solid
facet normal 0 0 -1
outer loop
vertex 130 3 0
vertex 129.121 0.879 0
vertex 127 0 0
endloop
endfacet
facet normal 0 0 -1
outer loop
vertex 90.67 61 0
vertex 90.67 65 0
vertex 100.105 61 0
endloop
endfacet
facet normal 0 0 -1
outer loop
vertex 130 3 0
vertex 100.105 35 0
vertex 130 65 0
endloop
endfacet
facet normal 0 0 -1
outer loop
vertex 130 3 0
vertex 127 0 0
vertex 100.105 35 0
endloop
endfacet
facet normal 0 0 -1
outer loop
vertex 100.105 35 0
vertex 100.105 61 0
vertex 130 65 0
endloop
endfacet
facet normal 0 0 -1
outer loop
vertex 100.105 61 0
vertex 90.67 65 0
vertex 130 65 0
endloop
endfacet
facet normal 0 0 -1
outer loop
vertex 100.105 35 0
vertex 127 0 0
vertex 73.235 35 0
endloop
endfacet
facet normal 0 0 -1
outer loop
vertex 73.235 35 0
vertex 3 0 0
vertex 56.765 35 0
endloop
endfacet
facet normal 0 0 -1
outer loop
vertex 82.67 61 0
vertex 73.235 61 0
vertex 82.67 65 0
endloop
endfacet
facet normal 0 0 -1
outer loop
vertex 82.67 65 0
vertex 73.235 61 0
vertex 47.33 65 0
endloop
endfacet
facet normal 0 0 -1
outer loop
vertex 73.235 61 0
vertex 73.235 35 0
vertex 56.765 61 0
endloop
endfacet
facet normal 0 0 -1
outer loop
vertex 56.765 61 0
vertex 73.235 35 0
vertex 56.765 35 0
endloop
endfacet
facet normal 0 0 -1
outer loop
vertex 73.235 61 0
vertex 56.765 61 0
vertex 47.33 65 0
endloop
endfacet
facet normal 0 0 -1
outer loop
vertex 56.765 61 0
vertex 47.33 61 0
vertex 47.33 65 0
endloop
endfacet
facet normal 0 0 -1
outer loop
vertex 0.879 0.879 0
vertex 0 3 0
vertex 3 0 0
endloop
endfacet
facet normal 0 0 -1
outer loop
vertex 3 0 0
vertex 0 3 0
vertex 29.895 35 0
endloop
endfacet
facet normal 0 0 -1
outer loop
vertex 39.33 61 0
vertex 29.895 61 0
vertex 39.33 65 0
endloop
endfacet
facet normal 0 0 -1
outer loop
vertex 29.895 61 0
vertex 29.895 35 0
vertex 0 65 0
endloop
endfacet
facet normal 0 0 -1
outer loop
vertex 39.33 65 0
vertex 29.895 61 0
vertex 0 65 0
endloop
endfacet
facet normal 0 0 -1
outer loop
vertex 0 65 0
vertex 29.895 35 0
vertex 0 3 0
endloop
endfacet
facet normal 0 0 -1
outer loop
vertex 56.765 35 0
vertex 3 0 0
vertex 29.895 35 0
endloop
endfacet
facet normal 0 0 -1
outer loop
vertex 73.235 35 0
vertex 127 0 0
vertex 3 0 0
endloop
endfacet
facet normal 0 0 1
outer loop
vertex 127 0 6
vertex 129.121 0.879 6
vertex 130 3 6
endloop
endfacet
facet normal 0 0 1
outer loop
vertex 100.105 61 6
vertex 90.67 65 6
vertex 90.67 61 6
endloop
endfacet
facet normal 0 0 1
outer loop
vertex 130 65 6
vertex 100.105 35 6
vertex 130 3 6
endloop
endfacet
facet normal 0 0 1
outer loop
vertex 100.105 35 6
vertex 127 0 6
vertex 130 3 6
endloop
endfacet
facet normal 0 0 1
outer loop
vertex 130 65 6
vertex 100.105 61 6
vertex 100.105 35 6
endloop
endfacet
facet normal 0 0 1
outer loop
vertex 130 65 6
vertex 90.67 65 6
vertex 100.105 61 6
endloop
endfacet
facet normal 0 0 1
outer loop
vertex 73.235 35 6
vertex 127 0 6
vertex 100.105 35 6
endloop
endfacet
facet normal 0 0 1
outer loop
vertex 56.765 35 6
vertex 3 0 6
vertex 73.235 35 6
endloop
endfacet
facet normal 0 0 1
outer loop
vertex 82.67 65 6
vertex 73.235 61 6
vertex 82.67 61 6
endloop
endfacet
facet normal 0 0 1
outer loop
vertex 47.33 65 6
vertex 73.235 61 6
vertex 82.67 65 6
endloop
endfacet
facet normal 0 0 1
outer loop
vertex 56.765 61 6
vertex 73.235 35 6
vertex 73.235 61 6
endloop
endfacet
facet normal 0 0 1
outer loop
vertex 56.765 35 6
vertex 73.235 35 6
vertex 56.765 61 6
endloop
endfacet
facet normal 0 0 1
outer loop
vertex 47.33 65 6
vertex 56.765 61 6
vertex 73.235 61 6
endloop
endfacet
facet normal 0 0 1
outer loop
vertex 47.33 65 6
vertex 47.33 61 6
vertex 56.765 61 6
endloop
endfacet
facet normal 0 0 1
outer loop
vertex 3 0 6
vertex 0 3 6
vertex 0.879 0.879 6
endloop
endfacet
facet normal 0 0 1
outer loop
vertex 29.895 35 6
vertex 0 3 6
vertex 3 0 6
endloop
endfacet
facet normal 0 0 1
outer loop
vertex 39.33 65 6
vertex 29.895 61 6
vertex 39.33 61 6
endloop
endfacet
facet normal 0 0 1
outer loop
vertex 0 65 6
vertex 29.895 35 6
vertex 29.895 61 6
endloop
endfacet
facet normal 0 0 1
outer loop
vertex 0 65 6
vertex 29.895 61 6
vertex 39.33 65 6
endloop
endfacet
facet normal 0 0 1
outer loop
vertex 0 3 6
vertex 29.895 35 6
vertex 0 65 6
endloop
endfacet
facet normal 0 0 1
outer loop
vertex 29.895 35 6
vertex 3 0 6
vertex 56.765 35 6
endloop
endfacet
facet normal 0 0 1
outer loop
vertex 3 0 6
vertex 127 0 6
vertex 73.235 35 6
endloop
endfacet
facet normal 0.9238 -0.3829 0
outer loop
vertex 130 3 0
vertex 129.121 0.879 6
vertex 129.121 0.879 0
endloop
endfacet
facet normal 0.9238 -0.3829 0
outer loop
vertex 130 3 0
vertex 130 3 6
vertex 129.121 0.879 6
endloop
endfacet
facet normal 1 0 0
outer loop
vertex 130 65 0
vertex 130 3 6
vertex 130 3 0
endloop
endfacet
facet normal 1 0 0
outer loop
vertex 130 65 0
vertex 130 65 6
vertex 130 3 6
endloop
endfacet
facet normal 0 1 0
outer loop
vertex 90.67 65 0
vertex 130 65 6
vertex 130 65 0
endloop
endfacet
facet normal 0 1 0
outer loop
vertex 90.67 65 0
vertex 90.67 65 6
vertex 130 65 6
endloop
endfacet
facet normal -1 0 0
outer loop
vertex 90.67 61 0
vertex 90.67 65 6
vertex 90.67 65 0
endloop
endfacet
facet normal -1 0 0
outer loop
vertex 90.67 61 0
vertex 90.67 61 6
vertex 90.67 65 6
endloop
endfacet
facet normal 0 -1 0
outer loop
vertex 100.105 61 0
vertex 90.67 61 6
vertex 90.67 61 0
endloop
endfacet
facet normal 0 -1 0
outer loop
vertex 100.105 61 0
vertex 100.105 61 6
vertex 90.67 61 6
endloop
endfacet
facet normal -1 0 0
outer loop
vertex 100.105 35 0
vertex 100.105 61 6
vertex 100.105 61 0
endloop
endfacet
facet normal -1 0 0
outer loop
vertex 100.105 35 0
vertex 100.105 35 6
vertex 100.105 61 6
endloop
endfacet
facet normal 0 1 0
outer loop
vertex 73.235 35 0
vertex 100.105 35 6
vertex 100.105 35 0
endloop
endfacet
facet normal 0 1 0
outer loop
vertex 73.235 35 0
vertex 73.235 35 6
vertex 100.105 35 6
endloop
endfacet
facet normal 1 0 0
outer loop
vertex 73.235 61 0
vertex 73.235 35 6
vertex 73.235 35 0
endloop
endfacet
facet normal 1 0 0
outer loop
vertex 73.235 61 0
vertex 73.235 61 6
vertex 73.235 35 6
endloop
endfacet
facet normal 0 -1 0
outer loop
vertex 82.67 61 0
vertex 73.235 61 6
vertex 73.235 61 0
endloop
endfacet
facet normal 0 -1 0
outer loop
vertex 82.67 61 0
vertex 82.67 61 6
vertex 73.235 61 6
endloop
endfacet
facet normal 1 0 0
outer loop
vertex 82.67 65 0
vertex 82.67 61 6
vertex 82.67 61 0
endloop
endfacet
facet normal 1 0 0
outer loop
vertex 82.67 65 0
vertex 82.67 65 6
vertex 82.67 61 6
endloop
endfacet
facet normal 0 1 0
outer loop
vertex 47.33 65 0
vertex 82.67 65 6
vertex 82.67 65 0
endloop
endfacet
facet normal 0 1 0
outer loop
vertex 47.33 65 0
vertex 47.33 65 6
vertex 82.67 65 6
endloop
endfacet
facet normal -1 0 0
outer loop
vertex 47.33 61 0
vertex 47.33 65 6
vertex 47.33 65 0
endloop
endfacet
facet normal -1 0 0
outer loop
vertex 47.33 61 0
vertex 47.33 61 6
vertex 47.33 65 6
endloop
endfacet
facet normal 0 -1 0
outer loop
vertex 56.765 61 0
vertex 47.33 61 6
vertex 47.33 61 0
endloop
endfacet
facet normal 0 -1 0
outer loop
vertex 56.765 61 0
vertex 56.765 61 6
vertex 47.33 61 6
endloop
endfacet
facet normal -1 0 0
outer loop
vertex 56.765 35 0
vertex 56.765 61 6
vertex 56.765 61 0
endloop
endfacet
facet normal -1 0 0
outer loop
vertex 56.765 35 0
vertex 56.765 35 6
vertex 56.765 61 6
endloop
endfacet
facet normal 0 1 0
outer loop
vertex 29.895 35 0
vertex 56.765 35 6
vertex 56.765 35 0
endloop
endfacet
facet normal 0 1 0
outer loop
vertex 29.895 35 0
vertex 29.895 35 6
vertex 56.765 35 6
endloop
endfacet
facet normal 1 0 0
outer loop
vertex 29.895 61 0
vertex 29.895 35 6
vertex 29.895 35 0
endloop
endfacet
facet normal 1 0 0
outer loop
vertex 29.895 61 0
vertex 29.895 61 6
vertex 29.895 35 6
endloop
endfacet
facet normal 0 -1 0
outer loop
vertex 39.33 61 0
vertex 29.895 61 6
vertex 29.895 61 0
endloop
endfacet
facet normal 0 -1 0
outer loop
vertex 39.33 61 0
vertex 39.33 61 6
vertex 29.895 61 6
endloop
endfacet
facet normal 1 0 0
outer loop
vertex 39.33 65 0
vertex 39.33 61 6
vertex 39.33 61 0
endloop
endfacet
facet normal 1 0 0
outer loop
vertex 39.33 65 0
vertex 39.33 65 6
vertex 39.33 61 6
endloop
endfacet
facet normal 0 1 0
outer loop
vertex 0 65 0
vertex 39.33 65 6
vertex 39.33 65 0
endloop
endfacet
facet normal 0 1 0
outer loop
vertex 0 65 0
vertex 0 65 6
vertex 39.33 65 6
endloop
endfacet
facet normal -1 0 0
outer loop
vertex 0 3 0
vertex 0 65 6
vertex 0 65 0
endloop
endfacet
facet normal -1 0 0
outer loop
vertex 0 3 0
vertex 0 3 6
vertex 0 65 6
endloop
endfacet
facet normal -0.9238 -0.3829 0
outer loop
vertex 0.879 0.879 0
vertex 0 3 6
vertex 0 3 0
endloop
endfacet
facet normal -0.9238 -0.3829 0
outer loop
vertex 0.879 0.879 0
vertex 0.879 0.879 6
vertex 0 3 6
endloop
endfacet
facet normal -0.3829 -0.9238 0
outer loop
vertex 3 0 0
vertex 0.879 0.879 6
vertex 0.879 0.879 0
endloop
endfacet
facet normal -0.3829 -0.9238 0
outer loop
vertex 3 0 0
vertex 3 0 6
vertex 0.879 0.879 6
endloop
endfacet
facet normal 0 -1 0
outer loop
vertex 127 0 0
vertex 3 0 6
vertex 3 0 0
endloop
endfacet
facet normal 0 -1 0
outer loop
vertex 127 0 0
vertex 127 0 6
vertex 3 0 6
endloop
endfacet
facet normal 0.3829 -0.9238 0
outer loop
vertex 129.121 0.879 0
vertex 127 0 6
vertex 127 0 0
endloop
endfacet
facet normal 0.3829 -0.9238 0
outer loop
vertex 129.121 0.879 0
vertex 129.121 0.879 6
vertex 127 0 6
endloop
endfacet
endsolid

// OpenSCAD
$fn = 32;

// ----------------------------------------------------------------------
// Window plate: 130 x 65 mm, 2 open windows
// ----------------------------------------------------------------------

// --- parameters (mm) ---
profile_height = 6;       // extrusion height
profile_points = 24;      // points of the closed outline

profile = [[0, 3], [0.879, 0.879], [3, 0], [127, 0], [129.121, 0.879], [130, 3], [130, 65], [90.67, 65], [90.67, 61], [100.105, 61], [100.105, 35], [73.235, 35], [73.235, 61], [82.67, 61], [82.67, 65], [47.33, 65], [47.33, 61], [56.765, 61], [56.765, 35], [29.895, 35], [29.895, 61], [39.33, 61], [39.33, 65], [0, 65]];  // single closed polygon, 24 points, counter clockwise

// --- the one profile operation ---
linear_extrude(height = profile_height) polygon(points = profile);
